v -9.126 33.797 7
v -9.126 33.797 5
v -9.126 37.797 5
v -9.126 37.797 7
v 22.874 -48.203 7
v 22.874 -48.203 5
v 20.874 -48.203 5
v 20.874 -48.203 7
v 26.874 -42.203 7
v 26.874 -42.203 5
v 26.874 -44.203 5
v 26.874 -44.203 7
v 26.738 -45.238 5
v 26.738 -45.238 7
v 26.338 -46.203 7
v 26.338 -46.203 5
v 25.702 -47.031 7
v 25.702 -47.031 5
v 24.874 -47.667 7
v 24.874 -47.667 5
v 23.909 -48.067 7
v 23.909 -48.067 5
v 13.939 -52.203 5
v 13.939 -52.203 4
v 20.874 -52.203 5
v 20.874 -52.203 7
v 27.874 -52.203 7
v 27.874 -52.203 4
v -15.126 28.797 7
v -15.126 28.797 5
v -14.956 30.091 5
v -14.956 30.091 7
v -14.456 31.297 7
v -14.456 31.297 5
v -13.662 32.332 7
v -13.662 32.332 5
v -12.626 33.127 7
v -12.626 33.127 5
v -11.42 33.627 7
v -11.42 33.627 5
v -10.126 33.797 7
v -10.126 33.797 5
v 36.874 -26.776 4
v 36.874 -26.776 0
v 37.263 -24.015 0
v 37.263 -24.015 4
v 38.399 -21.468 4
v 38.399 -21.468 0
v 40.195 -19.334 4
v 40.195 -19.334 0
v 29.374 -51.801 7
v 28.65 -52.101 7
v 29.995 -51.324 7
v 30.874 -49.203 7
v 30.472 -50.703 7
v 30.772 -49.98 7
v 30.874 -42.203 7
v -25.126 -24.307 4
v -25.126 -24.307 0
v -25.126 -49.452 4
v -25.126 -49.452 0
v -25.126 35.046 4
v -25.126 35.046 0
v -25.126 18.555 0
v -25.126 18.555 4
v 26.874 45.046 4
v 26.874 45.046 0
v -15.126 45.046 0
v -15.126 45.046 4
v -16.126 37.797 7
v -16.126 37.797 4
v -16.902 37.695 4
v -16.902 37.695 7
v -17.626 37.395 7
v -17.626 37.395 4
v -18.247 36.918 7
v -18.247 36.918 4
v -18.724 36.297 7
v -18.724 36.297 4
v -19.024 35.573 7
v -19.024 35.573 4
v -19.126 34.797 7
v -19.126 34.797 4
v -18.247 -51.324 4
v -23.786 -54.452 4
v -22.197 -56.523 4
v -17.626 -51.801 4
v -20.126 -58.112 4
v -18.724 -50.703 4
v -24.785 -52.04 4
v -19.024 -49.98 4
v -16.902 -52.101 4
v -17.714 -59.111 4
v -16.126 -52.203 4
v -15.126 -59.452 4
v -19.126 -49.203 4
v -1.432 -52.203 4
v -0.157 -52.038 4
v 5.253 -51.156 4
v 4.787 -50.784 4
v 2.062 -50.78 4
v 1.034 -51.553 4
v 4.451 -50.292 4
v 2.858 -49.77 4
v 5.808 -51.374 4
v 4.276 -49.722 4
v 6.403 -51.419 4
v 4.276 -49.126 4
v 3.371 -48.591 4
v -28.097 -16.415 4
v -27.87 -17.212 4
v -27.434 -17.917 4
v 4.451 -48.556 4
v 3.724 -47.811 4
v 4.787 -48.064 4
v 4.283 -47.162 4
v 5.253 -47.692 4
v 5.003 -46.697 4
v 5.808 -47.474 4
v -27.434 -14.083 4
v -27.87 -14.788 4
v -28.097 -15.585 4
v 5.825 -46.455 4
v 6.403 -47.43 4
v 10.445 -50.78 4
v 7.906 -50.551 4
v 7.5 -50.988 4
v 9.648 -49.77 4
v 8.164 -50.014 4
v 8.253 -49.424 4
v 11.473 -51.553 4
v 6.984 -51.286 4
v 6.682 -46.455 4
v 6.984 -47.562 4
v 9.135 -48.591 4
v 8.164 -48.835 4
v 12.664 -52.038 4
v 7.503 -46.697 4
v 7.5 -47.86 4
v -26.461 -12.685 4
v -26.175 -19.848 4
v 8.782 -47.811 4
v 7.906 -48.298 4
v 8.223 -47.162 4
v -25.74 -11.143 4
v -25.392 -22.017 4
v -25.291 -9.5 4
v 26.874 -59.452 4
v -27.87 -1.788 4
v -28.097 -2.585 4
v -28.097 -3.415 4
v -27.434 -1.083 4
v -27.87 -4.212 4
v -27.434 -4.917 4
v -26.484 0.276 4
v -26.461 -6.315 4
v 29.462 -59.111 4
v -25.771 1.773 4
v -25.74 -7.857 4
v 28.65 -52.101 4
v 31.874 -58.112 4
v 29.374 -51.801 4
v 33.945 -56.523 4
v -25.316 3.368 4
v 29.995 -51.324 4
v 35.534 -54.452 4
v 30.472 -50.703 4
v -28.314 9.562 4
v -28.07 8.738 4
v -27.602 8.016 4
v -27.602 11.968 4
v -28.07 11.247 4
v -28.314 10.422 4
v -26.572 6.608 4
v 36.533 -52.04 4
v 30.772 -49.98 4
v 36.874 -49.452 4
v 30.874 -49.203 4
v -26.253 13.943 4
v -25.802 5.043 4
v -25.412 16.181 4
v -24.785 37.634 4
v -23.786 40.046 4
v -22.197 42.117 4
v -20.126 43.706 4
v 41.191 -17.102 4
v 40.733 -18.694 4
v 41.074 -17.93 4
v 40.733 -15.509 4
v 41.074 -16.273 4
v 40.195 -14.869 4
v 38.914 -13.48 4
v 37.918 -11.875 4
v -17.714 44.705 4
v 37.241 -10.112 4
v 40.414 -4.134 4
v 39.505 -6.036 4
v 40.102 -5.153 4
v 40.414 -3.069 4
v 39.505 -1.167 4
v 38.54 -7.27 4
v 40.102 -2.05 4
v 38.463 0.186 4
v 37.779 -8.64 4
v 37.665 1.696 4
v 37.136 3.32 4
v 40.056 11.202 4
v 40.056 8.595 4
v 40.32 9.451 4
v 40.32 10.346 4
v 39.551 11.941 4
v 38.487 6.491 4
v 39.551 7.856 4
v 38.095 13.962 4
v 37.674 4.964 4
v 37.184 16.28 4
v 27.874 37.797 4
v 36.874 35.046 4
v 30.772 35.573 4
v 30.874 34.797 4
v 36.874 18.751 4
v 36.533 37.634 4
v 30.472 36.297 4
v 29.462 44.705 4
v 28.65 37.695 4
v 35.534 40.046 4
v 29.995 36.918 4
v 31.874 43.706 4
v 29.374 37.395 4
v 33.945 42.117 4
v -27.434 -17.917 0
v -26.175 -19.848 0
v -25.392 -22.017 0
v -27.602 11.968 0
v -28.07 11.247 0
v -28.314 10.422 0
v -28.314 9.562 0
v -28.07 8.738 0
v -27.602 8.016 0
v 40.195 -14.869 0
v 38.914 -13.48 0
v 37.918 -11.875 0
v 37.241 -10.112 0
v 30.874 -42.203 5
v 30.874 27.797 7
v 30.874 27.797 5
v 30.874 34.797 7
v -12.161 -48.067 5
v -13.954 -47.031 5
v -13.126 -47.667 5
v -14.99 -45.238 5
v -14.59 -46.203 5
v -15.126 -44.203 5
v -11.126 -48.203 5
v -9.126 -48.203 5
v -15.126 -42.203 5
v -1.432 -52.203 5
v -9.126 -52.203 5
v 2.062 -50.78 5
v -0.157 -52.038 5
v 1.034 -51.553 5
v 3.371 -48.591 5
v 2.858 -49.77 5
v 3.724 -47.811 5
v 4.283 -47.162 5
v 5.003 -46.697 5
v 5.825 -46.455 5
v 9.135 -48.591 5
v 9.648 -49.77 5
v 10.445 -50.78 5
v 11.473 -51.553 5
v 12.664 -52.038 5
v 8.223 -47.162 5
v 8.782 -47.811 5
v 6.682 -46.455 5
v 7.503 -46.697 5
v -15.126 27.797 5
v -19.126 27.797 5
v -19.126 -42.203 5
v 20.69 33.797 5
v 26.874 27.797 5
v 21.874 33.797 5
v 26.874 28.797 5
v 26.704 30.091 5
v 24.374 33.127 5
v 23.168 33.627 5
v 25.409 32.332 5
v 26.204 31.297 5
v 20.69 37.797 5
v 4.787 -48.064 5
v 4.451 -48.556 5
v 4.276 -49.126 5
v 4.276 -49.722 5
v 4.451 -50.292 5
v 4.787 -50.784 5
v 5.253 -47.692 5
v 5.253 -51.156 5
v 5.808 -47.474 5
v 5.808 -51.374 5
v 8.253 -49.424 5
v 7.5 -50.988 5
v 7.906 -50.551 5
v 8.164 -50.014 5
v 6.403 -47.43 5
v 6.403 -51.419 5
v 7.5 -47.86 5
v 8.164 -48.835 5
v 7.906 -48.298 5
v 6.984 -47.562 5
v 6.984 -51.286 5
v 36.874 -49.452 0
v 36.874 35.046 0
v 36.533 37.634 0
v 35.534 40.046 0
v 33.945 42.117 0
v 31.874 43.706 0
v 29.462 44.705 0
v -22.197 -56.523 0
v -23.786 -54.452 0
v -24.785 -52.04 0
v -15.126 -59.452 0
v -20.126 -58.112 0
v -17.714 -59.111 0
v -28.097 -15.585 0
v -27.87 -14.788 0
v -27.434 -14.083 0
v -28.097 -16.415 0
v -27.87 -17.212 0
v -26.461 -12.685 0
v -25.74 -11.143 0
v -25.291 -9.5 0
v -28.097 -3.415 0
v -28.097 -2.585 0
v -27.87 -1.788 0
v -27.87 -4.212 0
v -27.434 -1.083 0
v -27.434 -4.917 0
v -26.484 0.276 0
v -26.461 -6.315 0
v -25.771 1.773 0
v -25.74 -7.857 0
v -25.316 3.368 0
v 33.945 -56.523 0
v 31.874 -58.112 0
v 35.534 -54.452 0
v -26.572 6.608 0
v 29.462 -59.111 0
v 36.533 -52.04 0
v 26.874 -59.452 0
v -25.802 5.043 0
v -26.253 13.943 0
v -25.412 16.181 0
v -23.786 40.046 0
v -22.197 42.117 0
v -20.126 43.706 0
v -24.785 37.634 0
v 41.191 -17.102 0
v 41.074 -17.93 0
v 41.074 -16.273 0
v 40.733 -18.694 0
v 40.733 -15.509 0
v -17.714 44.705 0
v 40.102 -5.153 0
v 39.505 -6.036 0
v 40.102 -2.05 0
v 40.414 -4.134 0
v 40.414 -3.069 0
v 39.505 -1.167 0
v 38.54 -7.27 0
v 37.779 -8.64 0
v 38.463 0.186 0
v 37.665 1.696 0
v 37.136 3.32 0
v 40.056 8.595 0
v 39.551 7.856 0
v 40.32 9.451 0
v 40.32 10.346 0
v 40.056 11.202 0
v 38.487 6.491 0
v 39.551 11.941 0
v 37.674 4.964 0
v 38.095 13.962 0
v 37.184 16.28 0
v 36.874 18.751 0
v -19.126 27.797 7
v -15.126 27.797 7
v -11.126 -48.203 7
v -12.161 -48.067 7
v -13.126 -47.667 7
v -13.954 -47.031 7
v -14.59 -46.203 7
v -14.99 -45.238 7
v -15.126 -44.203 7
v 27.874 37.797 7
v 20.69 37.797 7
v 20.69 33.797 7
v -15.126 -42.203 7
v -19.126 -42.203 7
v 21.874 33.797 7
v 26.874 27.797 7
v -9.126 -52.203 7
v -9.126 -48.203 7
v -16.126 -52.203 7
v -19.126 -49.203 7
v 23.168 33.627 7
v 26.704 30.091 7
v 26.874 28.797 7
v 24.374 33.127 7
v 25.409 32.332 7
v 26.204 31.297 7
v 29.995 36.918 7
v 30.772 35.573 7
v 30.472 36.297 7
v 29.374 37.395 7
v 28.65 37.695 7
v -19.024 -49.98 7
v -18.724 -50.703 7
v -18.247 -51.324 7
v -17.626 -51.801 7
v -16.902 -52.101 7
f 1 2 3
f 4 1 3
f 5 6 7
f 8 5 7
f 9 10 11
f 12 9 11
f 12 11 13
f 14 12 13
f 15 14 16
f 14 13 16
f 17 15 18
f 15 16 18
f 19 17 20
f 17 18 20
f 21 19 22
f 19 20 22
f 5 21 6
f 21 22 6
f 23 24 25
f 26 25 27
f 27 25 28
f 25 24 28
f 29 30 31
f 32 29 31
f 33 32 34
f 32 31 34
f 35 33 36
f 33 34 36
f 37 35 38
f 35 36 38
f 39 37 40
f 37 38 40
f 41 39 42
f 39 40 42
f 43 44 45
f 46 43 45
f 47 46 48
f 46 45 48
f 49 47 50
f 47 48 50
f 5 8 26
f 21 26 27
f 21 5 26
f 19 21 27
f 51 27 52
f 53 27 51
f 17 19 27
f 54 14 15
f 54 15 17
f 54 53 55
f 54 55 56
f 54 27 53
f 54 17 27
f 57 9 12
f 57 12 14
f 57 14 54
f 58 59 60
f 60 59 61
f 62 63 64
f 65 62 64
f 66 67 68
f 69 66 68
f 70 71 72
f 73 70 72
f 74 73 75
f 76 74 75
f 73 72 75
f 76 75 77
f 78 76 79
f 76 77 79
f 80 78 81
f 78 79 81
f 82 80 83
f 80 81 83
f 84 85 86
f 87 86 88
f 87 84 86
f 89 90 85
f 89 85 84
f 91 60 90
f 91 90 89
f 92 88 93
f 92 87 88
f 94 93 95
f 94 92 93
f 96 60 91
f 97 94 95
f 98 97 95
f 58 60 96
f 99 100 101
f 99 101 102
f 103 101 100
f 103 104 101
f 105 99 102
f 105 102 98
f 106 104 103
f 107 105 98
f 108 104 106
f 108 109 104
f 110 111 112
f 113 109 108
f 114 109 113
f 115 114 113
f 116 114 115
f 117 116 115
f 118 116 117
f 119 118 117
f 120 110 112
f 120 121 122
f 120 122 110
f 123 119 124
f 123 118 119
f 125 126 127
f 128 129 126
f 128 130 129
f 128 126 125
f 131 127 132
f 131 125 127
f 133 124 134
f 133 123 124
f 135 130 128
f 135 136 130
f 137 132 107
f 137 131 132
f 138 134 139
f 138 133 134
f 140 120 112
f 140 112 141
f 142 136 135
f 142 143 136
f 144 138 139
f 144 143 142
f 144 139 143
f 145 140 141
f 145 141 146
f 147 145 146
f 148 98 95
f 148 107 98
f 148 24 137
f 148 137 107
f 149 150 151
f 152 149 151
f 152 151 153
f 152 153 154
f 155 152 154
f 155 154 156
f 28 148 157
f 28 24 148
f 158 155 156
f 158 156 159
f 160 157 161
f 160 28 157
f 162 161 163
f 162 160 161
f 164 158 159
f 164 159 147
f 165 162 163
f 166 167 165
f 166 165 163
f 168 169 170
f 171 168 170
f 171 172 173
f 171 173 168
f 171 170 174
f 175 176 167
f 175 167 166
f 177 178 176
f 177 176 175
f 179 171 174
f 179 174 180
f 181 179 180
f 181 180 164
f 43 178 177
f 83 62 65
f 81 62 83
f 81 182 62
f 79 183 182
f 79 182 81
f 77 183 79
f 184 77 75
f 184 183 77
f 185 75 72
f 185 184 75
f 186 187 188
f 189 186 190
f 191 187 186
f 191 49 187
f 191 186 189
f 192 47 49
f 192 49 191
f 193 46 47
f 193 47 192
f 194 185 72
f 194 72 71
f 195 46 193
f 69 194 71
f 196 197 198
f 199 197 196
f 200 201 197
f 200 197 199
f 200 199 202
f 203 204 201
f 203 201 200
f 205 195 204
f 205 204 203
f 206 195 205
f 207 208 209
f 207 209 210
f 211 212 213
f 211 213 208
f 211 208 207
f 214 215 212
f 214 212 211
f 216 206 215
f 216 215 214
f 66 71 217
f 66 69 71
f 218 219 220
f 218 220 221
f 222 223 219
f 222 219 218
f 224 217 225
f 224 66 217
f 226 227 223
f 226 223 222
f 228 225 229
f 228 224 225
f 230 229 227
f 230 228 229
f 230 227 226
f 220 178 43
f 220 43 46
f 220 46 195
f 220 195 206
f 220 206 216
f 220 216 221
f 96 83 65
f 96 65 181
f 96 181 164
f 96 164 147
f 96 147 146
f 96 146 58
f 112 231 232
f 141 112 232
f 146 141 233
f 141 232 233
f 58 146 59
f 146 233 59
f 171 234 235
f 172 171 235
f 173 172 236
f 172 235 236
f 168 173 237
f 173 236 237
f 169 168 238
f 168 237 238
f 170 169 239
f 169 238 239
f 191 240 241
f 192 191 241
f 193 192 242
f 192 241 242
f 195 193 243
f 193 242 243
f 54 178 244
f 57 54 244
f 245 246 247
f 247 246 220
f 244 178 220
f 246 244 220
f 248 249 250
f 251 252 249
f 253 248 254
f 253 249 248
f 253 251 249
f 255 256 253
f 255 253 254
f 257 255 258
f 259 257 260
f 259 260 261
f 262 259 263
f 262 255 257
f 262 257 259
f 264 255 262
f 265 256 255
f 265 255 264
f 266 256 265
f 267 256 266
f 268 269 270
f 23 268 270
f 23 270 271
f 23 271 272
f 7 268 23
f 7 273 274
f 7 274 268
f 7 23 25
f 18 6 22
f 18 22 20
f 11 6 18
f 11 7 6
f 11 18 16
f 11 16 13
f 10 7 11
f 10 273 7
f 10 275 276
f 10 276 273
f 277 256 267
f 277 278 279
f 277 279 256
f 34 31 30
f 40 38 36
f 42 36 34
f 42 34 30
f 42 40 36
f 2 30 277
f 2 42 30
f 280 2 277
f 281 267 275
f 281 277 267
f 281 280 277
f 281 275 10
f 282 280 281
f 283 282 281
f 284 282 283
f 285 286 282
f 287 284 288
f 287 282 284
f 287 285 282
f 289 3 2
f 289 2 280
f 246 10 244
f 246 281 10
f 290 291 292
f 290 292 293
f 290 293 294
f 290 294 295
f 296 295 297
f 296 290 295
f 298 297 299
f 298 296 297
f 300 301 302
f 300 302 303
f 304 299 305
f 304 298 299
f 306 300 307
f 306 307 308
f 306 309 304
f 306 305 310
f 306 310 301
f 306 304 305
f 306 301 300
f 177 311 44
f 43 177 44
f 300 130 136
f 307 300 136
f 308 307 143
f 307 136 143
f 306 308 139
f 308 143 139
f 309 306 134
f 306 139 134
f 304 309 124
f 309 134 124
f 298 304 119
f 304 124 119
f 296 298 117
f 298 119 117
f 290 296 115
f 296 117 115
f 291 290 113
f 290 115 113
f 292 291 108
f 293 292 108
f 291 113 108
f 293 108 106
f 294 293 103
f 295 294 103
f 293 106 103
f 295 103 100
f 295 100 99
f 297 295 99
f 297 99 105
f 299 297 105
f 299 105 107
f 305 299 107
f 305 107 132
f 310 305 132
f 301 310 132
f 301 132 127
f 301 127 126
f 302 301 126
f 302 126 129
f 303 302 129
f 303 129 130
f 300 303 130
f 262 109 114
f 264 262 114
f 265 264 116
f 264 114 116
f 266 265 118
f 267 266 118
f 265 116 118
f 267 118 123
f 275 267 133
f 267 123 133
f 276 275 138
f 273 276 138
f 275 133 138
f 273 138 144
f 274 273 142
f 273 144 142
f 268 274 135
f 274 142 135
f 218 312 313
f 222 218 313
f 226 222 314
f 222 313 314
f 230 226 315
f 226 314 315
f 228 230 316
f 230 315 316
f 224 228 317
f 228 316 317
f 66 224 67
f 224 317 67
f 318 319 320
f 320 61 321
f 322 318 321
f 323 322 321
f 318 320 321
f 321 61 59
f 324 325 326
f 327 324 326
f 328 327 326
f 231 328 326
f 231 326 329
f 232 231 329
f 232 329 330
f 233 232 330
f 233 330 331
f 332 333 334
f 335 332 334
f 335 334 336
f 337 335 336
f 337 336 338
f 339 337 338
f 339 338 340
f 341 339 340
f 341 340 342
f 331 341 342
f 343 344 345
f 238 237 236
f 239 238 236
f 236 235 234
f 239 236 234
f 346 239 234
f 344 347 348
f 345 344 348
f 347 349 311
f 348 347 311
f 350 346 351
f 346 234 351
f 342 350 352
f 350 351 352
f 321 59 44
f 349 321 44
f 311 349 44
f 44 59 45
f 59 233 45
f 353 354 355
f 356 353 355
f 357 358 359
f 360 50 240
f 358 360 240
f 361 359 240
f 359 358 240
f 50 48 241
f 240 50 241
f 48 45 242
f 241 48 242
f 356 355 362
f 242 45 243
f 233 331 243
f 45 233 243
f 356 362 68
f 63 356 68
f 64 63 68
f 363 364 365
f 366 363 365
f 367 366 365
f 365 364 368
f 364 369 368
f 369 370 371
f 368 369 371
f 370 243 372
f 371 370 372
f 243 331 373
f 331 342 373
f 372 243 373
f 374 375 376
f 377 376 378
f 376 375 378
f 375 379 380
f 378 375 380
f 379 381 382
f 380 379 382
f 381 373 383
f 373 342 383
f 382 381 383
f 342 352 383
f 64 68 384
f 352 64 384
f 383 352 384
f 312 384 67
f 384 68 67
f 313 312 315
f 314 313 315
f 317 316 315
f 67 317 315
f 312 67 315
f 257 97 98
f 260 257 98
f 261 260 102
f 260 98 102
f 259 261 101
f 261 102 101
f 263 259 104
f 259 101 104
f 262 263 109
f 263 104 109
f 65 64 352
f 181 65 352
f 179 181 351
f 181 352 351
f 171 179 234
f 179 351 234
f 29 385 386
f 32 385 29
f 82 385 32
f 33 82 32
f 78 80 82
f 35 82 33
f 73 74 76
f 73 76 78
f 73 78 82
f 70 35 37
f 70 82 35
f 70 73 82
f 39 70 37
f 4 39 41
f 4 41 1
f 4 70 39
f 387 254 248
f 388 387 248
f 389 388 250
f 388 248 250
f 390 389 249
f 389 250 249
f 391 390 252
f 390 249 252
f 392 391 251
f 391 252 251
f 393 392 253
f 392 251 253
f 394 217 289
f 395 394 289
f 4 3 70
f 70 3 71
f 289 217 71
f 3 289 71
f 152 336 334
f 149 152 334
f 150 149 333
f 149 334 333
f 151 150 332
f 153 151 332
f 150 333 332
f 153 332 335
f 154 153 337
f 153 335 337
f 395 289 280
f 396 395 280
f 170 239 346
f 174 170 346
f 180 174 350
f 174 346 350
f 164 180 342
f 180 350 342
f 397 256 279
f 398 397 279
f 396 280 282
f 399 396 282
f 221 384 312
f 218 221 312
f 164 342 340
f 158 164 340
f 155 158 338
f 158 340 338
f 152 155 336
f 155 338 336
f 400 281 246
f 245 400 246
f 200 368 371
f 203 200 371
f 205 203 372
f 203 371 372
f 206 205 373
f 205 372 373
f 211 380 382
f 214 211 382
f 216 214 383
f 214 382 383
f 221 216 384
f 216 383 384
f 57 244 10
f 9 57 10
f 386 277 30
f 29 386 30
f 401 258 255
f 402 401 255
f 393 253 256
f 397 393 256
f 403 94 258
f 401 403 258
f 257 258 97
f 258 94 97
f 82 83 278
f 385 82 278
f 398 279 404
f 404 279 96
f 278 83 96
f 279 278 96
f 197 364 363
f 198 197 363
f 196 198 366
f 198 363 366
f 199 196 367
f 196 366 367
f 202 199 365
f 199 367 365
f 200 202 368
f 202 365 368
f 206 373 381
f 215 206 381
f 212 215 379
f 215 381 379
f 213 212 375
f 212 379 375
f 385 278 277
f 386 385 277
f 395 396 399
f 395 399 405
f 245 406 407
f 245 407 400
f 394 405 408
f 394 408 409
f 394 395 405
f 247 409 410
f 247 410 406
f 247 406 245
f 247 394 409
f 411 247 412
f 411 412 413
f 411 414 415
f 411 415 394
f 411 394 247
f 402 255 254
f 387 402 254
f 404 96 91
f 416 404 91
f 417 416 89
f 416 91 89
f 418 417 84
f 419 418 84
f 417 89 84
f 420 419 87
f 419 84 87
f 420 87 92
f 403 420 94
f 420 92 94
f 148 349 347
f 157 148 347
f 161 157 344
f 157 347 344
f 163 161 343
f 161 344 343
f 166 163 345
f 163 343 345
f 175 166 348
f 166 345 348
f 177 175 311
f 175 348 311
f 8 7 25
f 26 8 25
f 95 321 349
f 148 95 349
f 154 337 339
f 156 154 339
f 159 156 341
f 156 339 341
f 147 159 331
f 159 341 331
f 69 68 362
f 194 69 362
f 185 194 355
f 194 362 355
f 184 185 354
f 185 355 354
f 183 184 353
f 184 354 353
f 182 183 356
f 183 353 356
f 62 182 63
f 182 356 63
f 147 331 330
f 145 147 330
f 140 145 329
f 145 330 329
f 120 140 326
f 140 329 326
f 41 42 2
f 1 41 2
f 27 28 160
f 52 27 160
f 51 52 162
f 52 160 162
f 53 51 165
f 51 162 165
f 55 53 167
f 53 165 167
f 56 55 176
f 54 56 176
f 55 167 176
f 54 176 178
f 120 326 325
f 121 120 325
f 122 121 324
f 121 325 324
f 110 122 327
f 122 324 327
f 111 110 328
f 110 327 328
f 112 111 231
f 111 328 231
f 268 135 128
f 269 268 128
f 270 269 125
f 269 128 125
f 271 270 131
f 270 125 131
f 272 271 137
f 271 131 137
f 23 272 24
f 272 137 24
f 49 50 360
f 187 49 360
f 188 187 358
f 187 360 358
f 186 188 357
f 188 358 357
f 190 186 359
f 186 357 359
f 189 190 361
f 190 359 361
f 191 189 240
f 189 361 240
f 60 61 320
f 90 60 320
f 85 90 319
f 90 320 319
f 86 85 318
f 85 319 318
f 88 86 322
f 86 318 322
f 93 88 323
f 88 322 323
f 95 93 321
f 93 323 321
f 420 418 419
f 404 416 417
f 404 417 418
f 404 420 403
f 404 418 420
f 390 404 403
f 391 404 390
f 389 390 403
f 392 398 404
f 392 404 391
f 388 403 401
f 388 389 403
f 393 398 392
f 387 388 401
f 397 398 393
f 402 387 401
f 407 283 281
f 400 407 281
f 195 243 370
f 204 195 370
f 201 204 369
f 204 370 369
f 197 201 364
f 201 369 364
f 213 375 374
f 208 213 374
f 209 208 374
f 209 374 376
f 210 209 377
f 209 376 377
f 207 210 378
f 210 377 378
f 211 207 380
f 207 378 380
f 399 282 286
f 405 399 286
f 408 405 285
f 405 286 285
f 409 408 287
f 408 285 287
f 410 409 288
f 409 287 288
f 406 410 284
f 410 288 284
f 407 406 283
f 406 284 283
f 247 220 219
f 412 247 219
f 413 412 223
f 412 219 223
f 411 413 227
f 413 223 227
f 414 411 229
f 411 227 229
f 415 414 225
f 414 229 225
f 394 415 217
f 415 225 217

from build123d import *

# Parameters (mm, degrees)
F0_R     = 2
F1_DEPTH = 4
F2_DEPTH = 5
F3_DEPTH = 7
F4_DEPTH = 5


with BuildPart() as f1:
    # F0 (on Top) → F1 (new body)
    with BuildSketch(Plane.XY):
        with BuildLine():
            Line((-15.1260387235, -59.4521127641), (26.8739612765, -59.4521127641))
            ThreePointArc((26.8739612765, -59.4521127641), (33.9450290884, -56.523180576), (36.8739612765, -49.4521127641))
            Line((36.8739612765, -49.4521127641), (36.8739612765, -26.7764899186))
            ThreePointArc((36.8739612765, -26.7764899186), (37.7418043208, -22.7017249762), (40.1947031436, -19.3342113163))
            ThreePointArc((40.1947031436, -19.3342113163), (41.1909257037, -17.1015277356), (40.1947031436, -14.8688441549))
            ThreePointArc((40.1947031436, -14.8688441549), (38.3782162175, -12.7012518837), (37.2412258633, -10.1117859269))
            ThreePointArc((37.2412258633, -10.1117859269), (38.1325390814, -7.9403059804), (39.5054840686, -6.0364187796))
            ThreePointArc((39.5054840686, -6.0364187796), (40.4532524775, -3.6015277356), (39.5054840686, -1.1666366915))
            ThreePointArc((39.5054840686, -1.1666366915), (38.0314315628, 0.9238685756), (37.135949584, 3.3199393357))
            ThreePointArc((37.135949584, 3.3199393357), (38.0470763022, 5.745513105), (39.5508012398, 7.8555773976))
            ThreePointArc((39.5508012398, 7.8555773976), (40.3538532288, 9.8984722644), (39.5508012398, 11.9413671312))
            ThreePointArc((39.5508012398, 11.9413671312), (37.5672002834, 15.092574421), (36.8739612765, 18.7510166874))
            Line((36.8739612765, 18.7510166874), (36.8739612765, 35.0460018218))
            ThreePointArc((36.8739612765, 35.0460018218), (33.9450290884, 42.1170696336), (26.8739612765, 45.0460018218))
            Line((26.8739612765, 45.0460018218), (-15.1260387235, 45.0460018218))
            ThreePointArc((-15.1260387235, 45.0460018218), (-22.1971065353, 42.1170696336), (-25.1260387235, 35.0460018218))
            Line((-25.1260387235, 35.0460018218), (-25.1260387235, 19.9840717389))
            Line((-25.1260387235, 19.9840717389), (-25.1260387235, 18.5548229328))
            ThreePointArc((-25.1260387235, 18.5548229328), (-25.7654117274, 15.0364906233), (-27.6017711715, 11.9680636533))
            ThreePointArc((-27.6017711715, 11.9680636533), (-28.3444909059, 9.9920358694), (-27.6017711715, 8.0160080856))
            ThreePointArc((-27.6017711715, 8.0160080856), (-26.1525927882, 5.8425546017), (-25.3157639737, 3.3679363345))
            ThreePointArc((-25.3157639737, 3.3679363345), (-26.0961993133, 1.0098808841), (-27.4337310312, -1.0830868009))
            ThreePointArc((-27.4337310312, -1.0830868009), (-28.1260387235, -3), (-27.4337310312, -4.9169131991))
            ThreePointArc((-27.4337310312, -4.9169131991), (-26.0675201626, -7.0706775127), (-25.2905870197, -9.5))
            ThreePointArc((-25.2905870197, -9.5), (-26.0675201626, -11.9293224873), (-27.4337310312, -14.0830868009))
            ThreePointArc((-27.4337310312, -14.0830868009), (-28.1260387235, -16), (-27.4337310312, -17.9169131991))
            ThreePointArc((-27.4337310312, -17.9169131991), (-25.7206392922, -20.9097927605), (-25.1260387235, -24.3066238629))
            Line((-25.1260387235, -24.3066238629), (-25.1260387235, -49.4521127641))
            ThreePointArc((-25.1260387235, -49.4521127641), (-22.1971065353, -56.523180576), (-15.1260387235, -59.4521127641))
        make_face()
        with Locations((6.253258194, -49.4241423296)):
            Circle(F0_R, mode=Mode.SUBTRACT)
        with BuildLine():
            Line((-16.1260387235, 37.7969445288), (-9.1260387235, 37.7969445288))
            Line((-9.1260387235, 37.7969445288), (20.6900215282, 37.7969445288))
            Line((20.6900215282, 37.7969445288), (27.8739612765, 37.7969445288))
            ThreePointArc((27.8739612765, 37.7969445288), (29.9952816201, 36.9182648724), (30.8739612765, 34.7969445288))
            Line((30.8739612765, 34.7969445288), (30.8739612765, 27.7969445288))
            Line((30.8739612765, 27.7969445288), (30.8739612765, -42.2030554712))
            Line((30.8739612765, -42.2030554712), (30.8739612765, -49.2030554712))
            ThreePointArc((30.8739612765, -49.2030554712), (29.9952816201, -51.3243758147), (27.8739612765, -52.2030554712))
            Line((27.8739612765, -52.2030554712), (20.8739612765, -52.2030554712))
            Line((20.8739612765, -52.2030554712), (13.9387492757, -52.2030554712))
            ThreePointArc((13.9387492757, -52.2030554712), (10.9338280149, -51.199359791), (9.1353173496, -48.5912347577))
            ThreePointArc((9.1353173496, -48.5912347577), (6.253258194, -46.4241423296), (3.3711990383, -48.5912347577))
            ThreePointArc((3.3711990383, -48.5912347577), (1.572688373, -51.199359791), (-1.4322328878, -52.2030554712))
            Line((-1.4322328878, -52.2030554712), (-9.1260387235, -52.2030554712))
            Line((-9.1260387235, -52.2030554712), (-16.1260387235, -52.2030554712))
            ThreePointArc((-16.1260387235, -52.2030554712), (-18.247359067, -51.3243758147), (-19.1260387235, -49.2030554712))
            Line((-19.1260387235, -49.2030554712), (-19.1260387235, -42.2030554712))
            Line((-19.1260387235, -42.2030554712), (-19.1260387235, 27.7969445288))
            Line((-19.1260387235, 27.7969445288), (-19.1260387235, 34.7969445288))
            ThreePointArc((-19.1260387235, 34.7969445288), (-18.247359067, 36.9182648724), (-16.1260387235, 37.7969445288))
        make_face(mode=Mode.SUBTRACT)
        with BuildLine():
            ThreePointArc((36.8739612765, -7.4265655526), (36.9662028486, -8.7816754868), (37.2412258633, -10.1117859269))
            ThreePointArc((37.2412258633, -10.1117859269), (36.9662028486, -11.441896367), (36.8739612765, -12.7970063012))
            Line((36.8739612765, -12.7970063012), (36.8739612765, -7.4265655526))
        make_face(mode=Mode.SUBTRACT)
        with BuildLine():
            ThreePointArc((36.8739612765, -12.7970063012), (36.9662028486, -11.441896367), (37.2412258633, -10.1117859269))
            ThreePointArc((37.2412258633, -10.1117859269), (36.9662028486, -8.7816754868), (36.8739612765, -7.4265655526))
            Line((36.8739612765, -7.4265655526), (36.8739612765, -12.7970063012))
        make_face()
    extrude(amount=F1_DEPTH)

    # F0 (on Top) → F2 (join)
    with BuildSketch(Plane.XY):
        with BuildLine():
            Line((20.6900215282, 37.7969445288), (-9.1260387235, 37.7969445288))
            Line((-9.1260387235, 37.7969445288), (-9.1260387235, 33.7969445288))
            Line((-9.1260387235, 33.7969445288), (-10.1260387235, 33.7969445288))
            ThreePointArc((-10.1260387235, 33.7969445288), (-13.6615726294, 32.3324784348), (-15.1260387235, 28.7969445288))
            Line((-15.1260387235, 28.7969445288), (-15.1260387235, 27.7969445288))
            Line((-15.1260387235, 27.7969445288), (-19.1260387235, 27.7969445288))
            Line((-19.1260387235, 27.7969445288), (-19.1260387235, -42.2030554712))
            Line((-19.1260387235, -42.2030554712), (-15.1260387235, -42.2030554712))
            Line((-15.1260387235, -42.2030554712), (-15.1260387235, -44.2030554712))
            ThreePointArc((-15.1260387235, -44.2030554712), (-13.9544658482, -47.0314825959), (-11.1260387235, -48.2030554712))
            Line((-11.1260387235, -48.2030554712), (-9.1260387235, -48.2030554712))
            Line((-9.1260387235, -48.2030554712), (-9.1260387235, -52.2030554712))
            Line((-9.1260387235, -52.2030554712), (-1.4322328878, -52.2030554712))
            ThreePointArc((-1.4322328878, -52.2030554712), (1.572688373, -51.199359791), (3.3711990383, -48.5912347577))
            ThreePointArc((3.3711990383, -48.5912347577), (6.253258194, -46.4241423296), (9.1353173496, -48.5912347577))
            ThreePointArc((9.1353173496, -48.5912347577), (10.9338280149, -51.199359791), (13.9387492757, -52.2030554712))
            Line((13.9387492757, -52.2030554712), (20.8739612765, -52.2030554712))
            Line((20.8739612765, -52.2030554712), (20.8739612765, -48.2030554712))
            Line((20.8739612765, -48.2030554712), (22.8739612765, -48.2030554712))
            ThreePointArc((22.8739612765, -48.2030554712), (25.7023884013, -47.0314825959), (26.8739612765, -44.2030554712))
            Line((26.8739612765, -44.2030554712), (26.8739612765, -42.2030554712))
            Line((26.8739612765, -42.2030554712), (30.8739612765, -42.2030554712))
            Line((30.8739612765, -42.2030554712), (30.8739612765, 27.7969445288))
            Line((30.8739612765, 27.7969445288), (26.8739612765, 27.7969445288))
            Line((26.8739612765, 27.7969445288), (26.8739612765, 28.7969445288))
            ThreePointArc((26.8739612765, 28.7969445288), (25.4094951825, 32.3324784348), (21.8739612765, 33.7969445288))
            Line((21.8739612765, 33.7969445288), (20.6900215282, 33.7969445288))
            Line((20.6900215282, 33.7969445288), (20.6900215282, 37.7969445288))
        make_face()
    extrude(amount=F2_DEPTH)

    # F0 (on Top) → F3 (join)
    with BuildSketch(Plane.XY):
        with BuildLine():
            Line((27.8739612765, 37.7969445288), (20.6900215282, 37.7969445288))
            Line((20.6900215282, 37.7969445288), (20.6900215282, 33.7969445288))
            Line((20.6900215282, 33.7969445288), (21.8739612765, 33.7969445288))
            ThreePointArc((21.8739612765, 33.7969445288), (25.4094951825, 32.3324784348), (26.8739612765, 28.7969445288))
            Line((26.8739612765, 28.7969445288), (26.8739612765, 27.7969445288))
            Line((26.8739612765, 27.7969445288), (30.8739612765, 27.7969445288))
            Line((30.8739612765, 27.7969445288), (30.8739612765, 34.7969445288))
            ThreePointArc((30.8739612765, 34.7969445288), (29.9952816201, 36.9182648724), (27.8739612765, 37.7969445288))
        make_face()
        with BuildLine():
            Line((-9.1260387235, 33.7969445288), (-9.1260387235, 37.7969445288))
            Line((-9.1260387235, 37.7969445288), (-16.1260387235, 37.7969445288))
            ThreePointArc((-16.1260387235, 37.7969445288), (-18.247359067, 36.9182648724), (-19.1260387235, 34.7969445288))
            Line((-19.1260387235, 34.7969445288), (-19.1260387235, 27.7969445288))
            Line((-19.1260387235, 27.7969445288), (-15.1260387235, 27.7969445288))
            Line((-15.1260387235, 27.7969445288), (-15.1260387235, 28.7969445288))
            ThreePointArc((-15.1260387235, 28.7969445288), (-13.6615726294, 32.3324784348), (-10.1260387235, 33.7969445288))
            Line((-10.1260387235, 33.7969445288), (-9.1260387235, 33.7969445288))
        make_face()
        with BuildLine():
            Line((30.8739612765, -49.2030554712), (30.8739612765, -42.2030554712))
            Line((30.8739612765, -42.2030554712), (26.8739612765, -42.2030554712))
            Line((26.8739612765, -42.2030554712), (26.8739612765, -44.2030554712))
            ThreePointArc((26.8739612765, -44.2030554712), (25.7023884013, -47.0314825959), (22.8739612765, -48.2030554712))
            Line((22.8739612765, -48.2030554712), (20.8739612765, -48.2030554712))
            Line((20.8739612765, -48.2030554712), (20.8739612765, -52.2030554712))
            Line((20.8739612765, -52.2030554712), (27.8739612765, -52.2030554712))
            ThreePointArc((27.8739612765, -52.2030554712), (29.9952816201, -51.3243758147), (30.8739612765, -49.2030554712))
        make_face()
        with BuildLine():
            Line((-15.1260387235, -42.2030554712), (-19.1260387235, -42.2030554712))
            Line((-19.1260387235, -42.2030554712), (-19.1260387235, -49.2030554712))
            ThreePointArc((-19.1260387235, -49.2030554712), (-18.247359067, -51.3243758147), (-16.1260387235, -52.2030554712))
            Line((-16.1260387235, -52.2030554712), (-9.1260387235, -52.2030554712))
            Line((-9.1260387235, -52.2030554712), (-9.1260387235, -48.2030554712))
            Line((-9.1260387235, -48.2030554712), (-11.1260387235, -48.2030554712))
            ThreePointArc((-11.1260387235, -48.2030554712), (-13.9544658482, -47.0314825959), (-15.1260387235, -44.2030554712))
            Line((-15.1260387235, -44.2030554712), (-15.1260387235, -42.2030554712))
        make_face()
    extrude(amount=F3_DEPTH)

    # F0 (on Top) → F4 (join)
    with BuildSketch(Plane.XY):
        with Locations((6.253258194, -49.4241423296)):
            Circle(F0_R)
    extrude(amount=F4_DEPTH)


solid = f1.part
